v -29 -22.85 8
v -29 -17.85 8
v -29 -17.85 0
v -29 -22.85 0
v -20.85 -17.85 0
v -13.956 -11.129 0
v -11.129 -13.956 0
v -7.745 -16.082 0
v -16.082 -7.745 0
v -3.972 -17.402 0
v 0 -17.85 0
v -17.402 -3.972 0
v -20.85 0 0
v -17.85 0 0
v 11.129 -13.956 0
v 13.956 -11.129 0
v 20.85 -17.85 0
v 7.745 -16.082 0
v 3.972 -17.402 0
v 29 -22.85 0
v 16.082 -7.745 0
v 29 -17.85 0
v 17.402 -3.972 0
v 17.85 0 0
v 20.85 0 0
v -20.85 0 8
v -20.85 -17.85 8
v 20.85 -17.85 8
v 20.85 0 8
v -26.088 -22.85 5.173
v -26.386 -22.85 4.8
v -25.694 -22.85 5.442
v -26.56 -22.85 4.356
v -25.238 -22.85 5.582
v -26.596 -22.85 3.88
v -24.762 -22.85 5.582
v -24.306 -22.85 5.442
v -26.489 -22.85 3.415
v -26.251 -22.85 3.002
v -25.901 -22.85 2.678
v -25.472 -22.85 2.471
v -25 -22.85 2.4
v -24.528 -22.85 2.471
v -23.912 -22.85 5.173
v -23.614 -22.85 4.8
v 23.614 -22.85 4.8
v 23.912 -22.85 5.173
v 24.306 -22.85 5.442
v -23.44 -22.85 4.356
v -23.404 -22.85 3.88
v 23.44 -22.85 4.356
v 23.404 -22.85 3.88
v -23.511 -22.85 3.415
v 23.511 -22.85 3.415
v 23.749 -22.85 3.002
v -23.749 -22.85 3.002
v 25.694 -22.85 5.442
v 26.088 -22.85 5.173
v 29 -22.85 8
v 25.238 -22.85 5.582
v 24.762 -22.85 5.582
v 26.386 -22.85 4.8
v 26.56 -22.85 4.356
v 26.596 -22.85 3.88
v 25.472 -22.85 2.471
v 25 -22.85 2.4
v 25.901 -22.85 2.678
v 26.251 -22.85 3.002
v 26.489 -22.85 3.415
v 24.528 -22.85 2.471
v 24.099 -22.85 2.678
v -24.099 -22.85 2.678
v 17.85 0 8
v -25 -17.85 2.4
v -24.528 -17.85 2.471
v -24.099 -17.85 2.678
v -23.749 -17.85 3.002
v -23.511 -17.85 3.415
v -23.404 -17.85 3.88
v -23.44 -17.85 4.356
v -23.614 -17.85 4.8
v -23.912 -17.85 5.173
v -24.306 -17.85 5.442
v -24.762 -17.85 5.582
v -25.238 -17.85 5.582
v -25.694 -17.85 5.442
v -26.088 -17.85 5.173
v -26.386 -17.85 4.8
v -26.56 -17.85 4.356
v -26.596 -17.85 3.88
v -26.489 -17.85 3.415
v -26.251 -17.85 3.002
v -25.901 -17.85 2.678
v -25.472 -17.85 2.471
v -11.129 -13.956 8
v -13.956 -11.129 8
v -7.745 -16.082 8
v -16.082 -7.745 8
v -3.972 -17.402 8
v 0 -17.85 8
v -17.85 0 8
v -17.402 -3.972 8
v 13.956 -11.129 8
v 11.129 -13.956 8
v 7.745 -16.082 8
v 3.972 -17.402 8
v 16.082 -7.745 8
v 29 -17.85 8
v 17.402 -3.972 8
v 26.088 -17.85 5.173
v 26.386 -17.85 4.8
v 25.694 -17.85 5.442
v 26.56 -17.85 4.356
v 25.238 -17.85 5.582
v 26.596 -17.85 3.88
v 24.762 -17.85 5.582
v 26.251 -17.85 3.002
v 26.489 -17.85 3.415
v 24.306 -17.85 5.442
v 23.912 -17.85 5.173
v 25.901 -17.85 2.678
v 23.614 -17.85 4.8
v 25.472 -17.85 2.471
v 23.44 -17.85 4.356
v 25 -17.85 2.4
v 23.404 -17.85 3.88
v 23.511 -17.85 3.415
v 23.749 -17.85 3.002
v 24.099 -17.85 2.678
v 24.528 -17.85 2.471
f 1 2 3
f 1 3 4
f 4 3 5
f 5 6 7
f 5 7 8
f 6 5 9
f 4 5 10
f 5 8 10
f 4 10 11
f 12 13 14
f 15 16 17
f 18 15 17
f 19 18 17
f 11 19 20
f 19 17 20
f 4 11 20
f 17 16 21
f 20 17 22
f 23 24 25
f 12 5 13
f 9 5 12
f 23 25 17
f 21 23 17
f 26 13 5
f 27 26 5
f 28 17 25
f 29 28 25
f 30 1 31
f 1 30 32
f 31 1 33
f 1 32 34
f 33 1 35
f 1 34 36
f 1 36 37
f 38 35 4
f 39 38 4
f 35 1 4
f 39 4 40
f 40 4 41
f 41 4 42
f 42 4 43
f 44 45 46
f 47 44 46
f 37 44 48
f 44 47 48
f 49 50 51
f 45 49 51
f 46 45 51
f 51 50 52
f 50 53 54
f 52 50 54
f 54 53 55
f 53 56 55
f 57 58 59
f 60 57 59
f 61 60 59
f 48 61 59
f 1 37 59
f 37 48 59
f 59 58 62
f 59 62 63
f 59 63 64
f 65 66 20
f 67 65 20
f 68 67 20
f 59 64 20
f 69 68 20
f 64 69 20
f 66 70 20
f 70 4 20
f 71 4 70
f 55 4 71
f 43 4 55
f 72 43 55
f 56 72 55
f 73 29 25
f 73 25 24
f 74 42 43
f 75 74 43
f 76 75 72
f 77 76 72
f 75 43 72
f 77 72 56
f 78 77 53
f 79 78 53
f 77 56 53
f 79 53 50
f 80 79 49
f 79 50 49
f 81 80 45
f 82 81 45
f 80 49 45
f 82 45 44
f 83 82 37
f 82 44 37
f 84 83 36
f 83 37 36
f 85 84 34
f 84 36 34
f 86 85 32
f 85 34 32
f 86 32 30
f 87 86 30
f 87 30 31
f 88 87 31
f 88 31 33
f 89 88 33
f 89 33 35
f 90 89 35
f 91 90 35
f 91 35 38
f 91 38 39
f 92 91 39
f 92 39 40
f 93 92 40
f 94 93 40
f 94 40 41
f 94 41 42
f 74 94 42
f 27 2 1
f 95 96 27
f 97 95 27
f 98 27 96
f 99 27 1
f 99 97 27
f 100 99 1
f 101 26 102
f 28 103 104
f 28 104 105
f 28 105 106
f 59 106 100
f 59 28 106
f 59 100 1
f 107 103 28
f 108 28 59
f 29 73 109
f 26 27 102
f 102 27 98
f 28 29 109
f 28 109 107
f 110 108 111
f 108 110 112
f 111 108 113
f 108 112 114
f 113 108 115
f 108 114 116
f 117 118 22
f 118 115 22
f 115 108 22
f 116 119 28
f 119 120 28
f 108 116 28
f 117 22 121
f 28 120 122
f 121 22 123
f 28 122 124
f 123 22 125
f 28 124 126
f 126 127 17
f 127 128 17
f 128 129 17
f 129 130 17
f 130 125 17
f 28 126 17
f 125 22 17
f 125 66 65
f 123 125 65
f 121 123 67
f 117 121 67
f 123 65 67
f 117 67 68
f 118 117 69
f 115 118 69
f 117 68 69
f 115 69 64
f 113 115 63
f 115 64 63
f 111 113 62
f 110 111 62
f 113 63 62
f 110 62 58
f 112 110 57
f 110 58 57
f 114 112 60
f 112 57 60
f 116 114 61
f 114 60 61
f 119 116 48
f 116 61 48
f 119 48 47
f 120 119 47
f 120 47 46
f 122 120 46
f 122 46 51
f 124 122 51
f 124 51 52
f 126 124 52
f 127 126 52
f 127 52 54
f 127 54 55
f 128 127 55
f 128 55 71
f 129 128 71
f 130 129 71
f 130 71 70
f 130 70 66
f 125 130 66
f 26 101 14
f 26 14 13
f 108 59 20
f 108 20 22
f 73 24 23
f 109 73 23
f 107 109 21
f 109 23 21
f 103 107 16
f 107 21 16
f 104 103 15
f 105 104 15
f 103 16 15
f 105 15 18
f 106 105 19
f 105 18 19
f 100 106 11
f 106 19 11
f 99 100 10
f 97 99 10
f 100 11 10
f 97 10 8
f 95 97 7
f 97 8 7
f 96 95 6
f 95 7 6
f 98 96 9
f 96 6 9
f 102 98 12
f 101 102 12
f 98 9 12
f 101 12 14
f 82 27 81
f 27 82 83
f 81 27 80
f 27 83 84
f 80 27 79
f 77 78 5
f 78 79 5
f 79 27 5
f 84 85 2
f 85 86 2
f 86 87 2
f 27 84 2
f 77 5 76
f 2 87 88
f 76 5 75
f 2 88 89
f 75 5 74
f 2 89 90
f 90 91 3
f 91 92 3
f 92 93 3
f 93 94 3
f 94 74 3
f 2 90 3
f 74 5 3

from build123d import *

# Parameters (mm, degrees)
EXTRUDE_1_DEPTH     = 8
SKETCH_2_R          = 1.6
CUT_EXTRUDE_1_DEPTH = 8


with BuildPart() as part:
    # ｽｹｯﾁ1 → ﾎﾞｽ - 押し出し1 (new body)
    with BuildSketch(Plane.XY):
        with BuildLine():
            Line((-17.85, 0), (-20.85, 0))
            Line((-20.85, 0), (-20.85, -17.85))
            Line((-20.85, -17.85), (-29, -17.85))
            Line((-29, -17.85), (-29, -22.85))
            Line((-29, -22.85), (29, -22.85))
            Line((29, -22.85), (29, -17.85))
            Line((29, -17.85), (20.85, -17.85))
            Line((20.85, -17.85), (20.85, 0))
            Line((20.85, 0), (17.85, 0))
            ThreePointArc((17.85, 0), (0, -17.85), (-17.85, 0))
        make_face()
    extrude(amount=EXTRUDE_1_DEPTH)

    # ｽｹｯﾁ2 → ｶｯﾄ - 押し出し1 (cut)
    with BuildSketch(Plane.XZ.offset(22.85)):
        with Locations(Location((-25, 4, 0), (0, 0, 270))):
            Circle(SKETCH_2_R)
        with Locations(Location((25, 4, 0), (0, 0, 270))):
            Circle(SKETCH_2_R)
    extrude(amount=-CUT_EXTRUDE_1_DEPTH, mode=Mode.SUBTRACT)


solid = part.part
